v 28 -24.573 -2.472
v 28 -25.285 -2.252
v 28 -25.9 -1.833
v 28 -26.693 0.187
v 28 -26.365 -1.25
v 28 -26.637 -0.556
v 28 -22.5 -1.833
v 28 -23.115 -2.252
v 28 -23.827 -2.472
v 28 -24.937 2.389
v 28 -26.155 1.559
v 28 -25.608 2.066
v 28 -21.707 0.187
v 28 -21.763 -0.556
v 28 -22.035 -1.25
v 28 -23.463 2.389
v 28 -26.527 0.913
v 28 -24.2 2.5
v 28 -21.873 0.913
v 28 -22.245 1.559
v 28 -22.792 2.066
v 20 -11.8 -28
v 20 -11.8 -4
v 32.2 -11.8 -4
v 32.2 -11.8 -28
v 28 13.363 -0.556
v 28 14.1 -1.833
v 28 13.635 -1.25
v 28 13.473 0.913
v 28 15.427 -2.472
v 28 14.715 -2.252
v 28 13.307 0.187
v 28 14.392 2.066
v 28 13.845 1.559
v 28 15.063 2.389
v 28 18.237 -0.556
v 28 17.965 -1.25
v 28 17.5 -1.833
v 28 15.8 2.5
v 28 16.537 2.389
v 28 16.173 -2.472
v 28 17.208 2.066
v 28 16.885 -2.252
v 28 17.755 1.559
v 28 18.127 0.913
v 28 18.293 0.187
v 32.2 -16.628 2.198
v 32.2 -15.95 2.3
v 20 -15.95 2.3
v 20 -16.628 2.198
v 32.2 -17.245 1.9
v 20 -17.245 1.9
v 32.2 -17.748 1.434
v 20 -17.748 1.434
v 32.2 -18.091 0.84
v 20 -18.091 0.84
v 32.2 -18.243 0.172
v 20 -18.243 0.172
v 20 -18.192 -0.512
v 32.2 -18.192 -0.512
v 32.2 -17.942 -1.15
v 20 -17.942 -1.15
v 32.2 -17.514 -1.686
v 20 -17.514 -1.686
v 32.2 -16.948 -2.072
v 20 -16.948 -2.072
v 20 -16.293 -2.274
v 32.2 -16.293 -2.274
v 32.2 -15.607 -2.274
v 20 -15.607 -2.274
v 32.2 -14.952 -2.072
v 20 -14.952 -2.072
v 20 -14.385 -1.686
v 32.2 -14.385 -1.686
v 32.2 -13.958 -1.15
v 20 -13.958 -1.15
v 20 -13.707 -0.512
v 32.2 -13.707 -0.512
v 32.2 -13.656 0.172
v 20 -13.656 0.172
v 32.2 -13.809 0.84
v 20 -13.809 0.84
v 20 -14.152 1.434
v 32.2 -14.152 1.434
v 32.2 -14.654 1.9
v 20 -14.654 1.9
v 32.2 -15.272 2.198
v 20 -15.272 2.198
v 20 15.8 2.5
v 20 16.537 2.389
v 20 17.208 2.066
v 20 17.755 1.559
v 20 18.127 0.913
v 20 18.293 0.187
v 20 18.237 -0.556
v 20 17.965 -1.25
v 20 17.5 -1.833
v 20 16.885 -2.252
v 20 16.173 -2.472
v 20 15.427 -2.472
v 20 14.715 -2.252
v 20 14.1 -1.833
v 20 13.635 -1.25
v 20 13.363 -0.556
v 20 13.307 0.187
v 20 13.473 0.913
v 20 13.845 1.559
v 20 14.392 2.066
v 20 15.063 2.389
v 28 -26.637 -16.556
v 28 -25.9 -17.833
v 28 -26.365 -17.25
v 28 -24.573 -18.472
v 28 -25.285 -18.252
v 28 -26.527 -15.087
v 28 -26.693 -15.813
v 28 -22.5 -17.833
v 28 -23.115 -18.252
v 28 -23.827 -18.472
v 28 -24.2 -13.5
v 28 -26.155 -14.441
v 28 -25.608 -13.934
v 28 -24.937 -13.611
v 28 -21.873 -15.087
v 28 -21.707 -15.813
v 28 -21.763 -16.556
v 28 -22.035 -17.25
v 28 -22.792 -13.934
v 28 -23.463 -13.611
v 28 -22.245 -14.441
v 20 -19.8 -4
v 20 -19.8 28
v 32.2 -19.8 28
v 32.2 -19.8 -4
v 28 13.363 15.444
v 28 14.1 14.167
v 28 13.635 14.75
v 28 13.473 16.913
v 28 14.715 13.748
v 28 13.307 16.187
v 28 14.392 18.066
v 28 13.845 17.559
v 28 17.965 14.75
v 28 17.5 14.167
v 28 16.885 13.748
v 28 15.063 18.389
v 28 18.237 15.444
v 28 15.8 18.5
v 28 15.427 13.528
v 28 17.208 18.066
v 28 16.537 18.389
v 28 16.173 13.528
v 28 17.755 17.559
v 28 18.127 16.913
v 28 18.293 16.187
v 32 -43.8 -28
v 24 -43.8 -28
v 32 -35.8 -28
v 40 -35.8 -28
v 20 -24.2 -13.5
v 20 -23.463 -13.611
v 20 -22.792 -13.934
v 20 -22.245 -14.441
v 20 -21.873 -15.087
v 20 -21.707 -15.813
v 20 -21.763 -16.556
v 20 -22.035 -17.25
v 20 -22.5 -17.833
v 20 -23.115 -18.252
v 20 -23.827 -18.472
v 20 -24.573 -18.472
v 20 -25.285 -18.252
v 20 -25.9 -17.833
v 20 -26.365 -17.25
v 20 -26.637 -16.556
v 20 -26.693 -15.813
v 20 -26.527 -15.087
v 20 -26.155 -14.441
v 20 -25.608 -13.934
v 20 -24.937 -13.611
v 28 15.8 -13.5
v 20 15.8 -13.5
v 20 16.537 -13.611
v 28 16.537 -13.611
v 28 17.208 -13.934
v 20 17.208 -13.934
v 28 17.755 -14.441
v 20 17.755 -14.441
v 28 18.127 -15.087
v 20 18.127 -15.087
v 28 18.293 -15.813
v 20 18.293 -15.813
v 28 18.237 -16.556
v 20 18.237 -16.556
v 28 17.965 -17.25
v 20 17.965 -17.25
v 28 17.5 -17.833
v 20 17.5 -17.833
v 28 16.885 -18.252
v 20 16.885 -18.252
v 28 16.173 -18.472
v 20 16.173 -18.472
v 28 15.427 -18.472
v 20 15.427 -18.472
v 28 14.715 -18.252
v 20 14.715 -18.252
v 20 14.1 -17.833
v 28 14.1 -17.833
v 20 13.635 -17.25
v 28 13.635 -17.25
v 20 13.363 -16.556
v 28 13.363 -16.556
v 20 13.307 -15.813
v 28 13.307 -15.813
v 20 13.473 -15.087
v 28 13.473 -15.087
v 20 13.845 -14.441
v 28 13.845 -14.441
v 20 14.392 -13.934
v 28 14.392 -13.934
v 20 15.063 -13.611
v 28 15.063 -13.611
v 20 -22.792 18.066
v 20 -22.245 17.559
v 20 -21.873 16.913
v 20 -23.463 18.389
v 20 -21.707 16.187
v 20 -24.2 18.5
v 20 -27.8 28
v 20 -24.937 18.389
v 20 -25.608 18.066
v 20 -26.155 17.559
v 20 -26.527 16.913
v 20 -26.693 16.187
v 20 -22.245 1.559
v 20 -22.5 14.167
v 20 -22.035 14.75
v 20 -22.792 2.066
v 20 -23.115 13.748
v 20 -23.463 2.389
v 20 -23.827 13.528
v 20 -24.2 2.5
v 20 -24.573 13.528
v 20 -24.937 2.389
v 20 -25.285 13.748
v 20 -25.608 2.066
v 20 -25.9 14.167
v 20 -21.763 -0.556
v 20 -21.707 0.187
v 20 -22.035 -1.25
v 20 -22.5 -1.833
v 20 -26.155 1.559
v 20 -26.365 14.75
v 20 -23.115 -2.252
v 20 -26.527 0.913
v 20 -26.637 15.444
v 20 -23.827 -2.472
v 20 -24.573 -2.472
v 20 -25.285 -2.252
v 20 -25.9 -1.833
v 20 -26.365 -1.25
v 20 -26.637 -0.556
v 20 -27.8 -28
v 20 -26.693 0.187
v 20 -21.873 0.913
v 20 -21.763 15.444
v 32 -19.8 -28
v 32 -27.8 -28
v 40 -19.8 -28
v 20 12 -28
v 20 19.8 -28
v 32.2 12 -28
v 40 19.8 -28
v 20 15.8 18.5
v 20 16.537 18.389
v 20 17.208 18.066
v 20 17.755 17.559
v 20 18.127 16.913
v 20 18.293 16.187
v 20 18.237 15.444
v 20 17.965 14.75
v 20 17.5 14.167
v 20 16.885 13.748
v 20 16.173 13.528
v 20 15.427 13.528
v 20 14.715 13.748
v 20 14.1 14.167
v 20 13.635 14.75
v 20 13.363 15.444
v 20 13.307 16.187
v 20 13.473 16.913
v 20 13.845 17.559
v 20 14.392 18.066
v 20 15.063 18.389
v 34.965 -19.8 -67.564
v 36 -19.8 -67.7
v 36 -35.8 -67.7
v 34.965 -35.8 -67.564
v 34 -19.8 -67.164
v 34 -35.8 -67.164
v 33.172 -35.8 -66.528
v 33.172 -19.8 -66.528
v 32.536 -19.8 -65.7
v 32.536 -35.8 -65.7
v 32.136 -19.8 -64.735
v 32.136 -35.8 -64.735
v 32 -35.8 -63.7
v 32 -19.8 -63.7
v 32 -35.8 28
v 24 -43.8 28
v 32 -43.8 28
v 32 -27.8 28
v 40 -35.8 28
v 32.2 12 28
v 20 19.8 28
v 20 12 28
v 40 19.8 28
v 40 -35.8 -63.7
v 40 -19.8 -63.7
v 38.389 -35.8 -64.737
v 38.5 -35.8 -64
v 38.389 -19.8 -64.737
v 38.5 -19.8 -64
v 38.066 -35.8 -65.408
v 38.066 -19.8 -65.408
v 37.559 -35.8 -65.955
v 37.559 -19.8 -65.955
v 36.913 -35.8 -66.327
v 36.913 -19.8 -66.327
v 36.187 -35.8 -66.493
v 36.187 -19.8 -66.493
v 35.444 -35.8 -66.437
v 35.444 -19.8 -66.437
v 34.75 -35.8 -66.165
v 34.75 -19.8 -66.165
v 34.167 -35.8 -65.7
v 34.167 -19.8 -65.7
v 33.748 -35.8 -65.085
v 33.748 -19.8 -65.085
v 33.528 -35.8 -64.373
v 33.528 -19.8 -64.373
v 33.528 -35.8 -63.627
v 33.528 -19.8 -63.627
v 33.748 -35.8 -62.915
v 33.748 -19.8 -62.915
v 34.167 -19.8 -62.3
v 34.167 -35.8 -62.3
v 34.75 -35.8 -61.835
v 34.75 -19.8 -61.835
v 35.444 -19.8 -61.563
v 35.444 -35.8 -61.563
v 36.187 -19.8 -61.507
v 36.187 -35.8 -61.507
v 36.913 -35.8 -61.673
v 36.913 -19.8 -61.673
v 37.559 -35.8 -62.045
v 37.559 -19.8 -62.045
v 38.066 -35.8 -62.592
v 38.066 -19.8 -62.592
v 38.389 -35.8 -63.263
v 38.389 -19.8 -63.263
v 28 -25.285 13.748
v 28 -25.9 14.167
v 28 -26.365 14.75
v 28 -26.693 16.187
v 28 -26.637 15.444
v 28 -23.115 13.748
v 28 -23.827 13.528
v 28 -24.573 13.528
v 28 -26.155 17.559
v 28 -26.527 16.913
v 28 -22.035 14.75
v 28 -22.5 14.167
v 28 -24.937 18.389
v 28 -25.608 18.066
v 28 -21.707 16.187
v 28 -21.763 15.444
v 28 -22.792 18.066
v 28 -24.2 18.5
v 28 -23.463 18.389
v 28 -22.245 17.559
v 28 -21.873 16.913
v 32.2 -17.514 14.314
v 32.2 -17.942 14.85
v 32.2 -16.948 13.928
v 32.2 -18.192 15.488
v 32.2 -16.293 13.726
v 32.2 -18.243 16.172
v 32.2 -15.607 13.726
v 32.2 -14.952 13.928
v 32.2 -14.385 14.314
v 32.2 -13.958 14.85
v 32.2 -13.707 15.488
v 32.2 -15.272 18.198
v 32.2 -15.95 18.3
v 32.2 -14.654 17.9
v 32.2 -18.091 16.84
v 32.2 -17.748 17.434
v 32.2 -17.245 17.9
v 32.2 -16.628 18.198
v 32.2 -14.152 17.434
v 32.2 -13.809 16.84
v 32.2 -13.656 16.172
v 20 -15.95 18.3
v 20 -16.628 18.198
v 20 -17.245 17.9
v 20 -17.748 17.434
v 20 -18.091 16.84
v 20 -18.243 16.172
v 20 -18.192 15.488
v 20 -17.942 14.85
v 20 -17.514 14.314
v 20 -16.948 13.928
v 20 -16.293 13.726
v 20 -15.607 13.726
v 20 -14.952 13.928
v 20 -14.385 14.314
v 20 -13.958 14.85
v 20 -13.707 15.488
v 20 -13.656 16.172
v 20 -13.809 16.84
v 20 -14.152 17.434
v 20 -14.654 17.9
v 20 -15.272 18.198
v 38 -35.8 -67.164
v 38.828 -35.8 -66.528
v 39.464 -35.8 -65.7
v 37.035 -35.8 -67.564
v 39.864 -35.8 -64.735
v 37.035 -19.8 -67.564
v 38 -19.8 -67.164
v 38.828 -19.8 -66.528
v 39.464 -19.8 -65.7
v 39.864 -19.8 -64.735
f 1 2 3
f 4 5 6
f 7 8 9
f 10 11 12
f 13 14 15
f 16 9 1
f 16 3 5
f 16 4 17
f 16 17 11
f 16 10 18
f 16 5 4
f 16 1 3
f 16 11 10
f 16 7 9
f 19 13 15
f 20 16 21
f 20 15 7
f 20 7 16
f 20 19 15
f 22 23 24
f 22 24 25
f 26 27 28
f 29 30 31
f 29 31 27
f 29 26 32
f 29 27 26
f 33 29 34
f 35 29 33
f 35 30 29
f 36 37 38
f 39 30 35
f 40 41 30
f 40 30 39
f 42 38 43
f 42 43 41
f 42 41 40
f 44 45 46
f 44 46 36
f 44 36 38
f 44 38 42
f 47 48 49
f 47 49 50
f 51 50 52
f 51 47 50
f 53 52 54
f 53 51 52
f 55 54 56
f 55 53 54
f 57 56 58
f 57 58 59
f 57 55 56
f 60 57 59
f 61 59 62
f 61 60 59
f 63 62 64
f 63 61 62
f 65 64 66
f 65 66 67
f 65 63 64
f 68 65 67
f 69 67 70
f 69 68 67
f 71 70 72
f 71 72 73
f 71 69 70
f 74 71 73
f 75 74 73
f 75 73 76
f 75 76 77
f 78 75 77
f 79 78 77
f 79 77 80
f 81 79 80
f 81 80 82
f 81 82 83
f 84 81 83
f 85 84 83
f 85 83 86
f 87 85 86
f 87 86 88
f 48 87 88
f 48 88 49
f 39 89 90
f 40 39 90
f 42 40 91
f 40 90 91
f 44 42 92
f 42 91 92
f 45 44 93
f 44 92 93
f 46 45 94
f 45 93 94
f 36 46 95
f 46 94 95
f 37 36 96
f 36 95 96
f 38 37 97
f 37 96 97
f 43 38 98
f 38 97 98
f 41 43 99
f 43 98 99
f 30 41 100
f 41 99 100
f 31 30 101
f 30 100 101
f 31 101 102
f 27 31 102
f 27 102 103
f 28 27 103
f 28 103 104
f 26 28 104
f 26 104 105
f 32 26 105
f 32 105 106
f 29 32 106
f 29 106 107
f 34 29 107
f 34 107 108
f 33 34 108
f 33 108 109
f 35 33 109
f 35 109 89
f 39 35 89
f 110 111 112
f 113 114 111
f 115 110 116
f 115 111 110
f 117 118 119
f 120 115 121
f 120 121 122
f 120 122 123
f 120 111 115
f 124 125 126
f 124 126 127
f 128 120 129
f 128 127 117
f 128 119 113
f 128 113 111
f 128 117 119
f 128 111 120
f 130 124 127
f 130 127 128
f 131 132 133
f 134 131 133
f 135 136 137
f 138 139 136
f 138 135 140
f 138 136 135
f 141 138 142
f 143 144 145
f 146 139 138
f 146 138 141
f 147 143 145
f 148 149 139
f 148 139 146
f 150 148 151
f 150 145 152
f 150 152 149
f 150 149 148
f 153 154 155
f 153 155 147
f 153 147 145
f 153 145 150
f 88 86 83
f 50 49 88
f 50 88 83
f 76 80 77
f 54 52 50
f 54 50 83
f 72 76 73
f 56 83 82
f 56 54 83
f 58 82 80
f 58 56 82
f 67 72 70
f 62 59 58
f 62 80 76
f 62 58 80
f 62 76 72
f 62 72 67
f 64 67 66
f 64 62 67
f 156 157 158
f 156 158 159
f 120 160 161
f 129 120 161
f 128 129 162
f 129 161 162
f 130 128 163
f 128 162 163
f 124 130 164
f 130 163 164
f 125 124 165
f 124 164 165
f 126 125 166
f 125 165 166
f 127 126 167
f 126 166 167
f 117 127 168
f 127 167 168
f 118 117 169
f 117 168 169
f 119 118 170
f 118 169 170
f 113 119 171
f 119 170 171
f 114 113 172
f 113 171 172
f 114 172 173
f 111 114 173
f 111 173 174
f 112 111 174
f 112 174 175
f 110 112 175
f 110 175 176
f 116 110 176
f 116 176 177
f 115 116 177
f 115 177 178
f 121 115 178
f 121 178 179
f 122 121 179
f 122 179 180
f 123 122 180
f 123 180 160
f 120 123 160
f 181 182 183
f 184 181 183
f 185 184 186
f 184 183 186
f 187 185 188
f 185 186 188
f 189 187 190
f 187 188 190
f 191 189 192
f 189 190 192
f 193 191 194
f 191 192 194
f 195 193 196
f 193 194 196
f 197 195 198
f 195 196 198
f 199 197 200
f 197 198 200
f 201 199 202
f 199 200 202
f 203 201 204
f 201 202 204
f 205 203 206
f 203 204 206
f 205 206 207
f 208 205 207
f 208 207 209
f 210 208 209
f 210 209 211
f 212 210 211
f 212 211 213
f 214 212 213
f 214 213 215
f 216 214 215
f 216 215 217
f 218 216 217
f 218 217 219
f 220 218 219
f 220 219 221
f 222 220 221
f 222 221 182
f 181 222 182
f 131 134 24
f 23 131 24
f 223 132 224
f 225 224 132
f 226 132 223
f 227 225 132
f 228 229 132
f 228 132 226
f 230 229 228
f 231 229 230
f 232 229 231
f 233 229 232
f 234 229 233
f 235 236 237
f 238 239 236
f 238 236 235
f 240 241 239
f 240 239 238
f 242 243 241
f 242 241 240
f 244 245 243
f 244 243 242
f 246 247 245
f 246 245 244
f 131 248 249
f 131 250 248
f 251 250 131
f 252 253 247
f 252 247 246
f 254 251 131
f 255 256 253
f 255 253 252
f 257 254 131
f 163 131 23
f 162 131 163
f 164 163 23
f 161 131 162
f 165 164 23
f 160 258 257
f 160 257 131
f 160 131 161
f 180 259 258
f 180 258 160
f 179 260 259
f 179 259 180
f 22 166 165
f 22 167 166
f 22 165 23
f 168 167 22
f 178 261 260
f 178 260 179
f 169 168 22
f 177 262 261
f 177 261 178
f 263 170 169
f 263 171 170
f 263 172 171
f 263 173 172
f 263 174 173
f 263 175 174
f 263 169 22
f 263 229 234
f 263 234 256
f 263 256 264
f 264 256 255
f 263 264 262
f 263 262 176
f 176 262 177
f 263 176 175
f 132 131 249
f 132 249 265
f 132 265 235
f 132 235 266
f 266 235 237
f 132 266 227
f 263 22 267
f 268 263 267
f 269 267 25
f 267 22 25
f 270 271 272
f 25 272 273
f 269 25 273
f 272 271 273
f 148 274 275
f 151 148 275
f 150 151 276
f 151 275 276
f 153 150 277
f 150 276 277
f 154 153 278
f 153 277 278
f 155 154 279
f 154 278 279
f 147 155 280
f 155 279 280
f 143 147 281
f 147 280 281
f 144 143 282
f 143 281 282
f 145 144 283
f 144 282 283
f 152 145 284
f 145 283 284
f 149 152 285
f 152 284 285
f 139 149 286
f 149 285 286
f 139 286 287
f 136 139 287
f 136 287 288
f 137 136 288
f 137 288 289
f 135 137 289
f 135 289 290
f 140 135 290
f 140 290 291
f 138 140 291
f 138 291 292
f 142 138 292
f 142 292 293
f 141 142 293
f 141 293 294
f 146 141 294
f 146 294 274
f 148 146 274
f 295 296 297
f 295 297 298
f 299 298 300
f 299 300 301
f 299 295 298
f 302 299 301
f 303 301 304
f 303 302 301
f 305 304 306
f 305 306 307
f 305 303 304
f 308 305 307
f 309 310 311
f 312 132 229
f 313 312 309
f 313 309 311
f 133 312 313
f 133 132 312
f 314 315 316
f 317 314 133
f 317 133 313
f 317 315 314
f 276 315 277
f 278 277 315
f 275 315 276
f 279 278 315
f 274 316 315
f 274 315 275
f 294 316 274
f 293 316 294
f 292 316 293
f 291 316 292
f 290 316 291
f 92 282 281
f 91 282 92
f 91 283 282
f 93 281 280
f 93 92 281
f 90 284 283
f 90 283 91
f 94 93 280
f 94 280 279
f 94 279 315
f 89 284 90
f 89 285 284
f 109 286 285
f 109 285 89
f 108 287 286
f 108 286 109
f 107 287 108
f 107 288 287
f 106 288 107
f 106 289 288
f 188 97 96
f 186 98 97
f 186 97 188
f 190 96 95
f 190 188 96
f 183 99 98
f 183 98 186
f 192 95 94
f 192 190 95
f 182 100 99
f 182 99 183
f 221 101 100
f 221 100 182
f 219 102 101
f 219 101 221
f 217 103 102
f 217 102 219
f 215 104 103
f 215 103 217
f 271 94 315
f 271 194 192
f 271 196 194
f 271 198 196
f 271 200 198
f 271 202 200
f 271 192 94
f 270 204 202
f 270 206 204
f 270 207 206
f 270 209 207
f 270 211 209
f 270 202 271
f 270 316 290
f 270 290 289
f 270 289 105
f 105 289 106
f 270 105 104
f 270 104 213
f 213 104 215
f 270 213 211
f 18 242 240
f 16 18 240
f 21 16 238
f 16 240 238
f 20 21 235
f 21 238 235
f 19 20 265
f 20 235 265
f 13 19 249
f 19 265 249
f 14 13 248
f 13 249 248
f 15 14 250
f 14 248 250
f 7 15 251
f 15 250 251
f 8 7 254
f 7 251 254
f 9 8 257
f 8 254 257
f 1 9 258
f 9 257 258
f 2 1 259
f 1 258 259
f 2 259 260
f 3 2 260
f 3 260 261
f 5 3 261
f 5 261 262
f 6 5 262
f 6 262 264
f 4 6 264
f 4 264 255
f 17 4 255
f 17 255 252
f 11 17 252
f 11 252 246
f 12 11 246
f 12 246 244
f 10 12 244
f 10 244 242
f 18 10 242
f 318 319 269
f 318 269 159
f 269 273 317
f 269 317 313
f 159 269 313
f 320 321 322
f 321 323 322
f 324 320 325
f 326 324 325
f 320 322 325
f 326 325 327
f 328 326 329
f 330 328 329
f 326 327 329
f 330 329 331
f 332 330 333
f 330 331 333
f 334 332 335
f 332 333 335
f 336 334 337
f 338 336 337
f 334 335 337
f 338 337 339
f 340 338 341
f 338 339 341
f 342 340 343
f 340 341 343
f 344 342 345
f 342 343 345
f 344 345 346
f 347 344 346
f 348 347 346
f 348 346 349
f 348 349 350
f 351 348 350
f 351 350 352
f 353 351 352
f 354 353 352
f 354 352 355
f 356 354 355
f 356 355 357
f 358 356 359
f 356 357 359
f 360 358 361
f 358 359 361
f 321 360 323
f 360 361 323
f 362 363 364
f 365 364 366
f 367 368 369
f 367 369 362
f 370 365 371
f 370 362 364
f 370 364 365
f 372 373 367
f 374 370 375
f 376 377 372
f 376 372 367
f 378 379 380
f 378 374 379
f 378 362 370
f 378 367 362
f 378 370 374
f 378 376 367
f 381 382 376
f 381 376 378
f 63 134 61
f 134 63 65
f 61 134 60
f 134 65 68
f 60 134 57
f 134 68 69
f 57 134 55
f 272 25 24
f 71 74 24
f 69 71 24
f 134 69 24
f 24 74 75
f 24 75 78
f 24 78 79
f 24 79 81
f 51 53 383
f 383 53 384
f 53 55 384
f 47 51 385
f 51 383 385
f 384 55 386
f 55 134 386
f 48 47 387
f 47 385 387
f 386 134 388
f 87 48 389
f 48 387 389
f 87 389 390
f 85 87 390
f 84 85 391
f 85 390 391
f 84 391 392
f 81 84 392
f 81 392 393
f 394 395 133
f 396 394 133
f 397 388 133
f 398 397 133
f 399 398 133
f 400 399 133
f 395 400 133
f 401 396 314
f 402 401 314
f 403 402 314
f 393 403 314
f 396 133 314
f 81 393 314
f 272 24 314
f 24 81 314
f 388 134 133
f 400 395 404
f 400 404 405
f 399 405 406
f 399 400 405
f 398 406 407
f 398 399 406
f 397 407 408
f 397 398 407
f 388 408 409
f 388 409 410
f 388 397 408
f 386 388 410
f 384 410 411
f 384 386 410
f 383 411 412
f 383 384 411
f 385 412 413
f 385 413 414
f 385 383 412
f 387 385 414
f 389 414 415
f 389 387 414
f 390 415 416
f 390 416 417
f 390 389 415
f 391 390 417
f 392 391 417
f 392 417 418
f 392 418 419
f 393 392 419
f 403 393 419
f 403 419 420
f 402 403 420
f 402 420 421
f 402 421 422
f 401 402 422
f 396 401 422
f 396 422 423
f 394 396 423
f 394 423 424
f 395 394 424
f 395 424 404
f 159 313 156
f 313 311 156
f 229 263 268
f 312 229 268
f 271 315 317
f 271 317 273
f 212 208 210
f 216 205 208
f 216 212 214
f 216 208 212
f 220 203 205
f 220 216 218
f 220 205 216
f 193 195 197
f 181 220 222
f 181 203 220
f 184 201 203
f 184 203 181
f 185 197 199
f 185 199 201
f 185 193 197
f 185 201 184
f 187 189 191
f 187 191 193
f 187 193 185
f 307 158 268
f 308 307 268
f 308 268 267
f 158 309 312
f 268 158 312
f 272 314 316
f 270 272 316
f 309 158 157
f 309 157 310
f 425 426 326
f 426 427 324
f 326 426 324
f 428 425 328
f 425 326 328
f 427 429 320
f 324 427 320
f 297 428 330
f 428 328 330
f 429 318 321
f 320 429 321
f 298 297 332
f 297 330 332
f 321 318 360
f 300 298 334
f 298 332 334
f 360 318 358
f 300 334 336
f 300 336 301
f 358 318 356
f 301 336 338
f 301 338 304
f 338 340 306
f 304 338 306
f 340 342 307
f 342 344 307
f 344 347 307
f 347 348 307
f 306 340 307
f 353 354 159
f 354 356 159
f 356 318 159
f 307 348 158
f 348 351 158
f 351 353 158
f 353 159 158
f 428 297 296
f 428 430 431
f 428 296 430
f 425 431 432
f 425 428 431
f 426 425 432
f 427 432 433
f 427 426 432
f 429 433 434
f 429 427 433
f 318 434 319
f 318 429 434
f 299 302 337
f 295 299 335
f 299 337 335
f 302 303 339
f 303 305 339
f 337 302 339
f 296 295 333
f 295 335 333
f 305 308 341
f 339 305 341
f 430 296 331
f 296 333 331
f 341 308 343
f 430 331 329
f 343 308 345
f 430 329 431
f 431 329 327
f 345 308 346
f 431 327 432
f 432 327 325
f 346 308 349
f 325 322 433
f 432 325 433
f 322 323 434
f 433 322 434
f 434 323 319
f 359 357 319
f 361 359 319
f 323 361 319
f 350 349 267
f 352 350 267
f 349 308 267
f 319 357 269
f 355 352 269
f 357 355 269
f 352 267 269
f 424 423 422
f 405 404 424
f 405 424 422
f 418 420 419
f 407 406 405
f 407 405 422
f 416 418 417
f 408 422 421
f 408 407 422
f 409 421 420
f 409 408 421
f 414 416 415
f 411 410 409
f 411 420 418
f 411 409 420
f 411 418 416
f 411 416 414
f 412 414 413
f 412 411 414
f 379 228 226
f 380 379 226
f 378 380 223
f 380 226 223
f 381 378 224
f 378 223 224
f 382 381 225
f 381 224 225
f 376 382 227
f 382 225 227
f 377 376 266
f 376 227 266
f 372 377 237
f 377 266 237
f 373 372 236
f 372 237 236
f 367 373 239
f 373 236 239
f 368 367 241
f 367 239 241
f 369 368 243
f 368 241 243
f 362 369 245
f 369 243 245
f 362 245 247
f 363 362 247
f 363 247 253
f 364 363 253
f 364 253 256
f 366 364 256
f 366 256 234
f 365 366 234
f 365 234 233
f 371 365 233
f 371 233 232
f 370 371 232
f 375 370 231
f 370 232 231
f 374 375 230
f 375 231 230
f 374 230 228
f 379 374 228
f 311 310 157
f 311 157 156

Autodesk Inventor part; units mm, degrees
ref_plane "YZ Plane" through (0, 0, 0) normal (1, 0, 0) x (0, 1, 0)
ref_plane "XZ Plane" through (0, 0, 0) normal (0, 1, 0) x (-1, 0, 0)
ref_plane "XY Plane" through (0, 0, 0) normal (0, 0, 1) x (1, 0, 0)
sketch "Sketch1" plane through (0, 0, 0) normal (1, 0, 0) x (0, 1, 0)
  line L0 (-19.8, 28) -> (19.8, 28)
  line L1 (19.8, 28) -> (19.8, -28)
  line L2 (19.8, -28) -> (-19.8, -28)
  line L3 (-19.8, -28) -> (-19.8, 28)
  line L4 (-19.8, 28) -> (19.8, -28) construction
  line L5 (19.8, 28) -> (-19.8, -28) construction
  point P0 (0, 0)
  dimension "d0" = 39.6
  dimension "d1" = 56
extrude "Extrusion1" add sketch "Sketch1" along normal blind 40
sketch "Sketch2" plane through (0, -19.8, 28) normal (0, 0, 1) x (1, 0, 0)
  line L0 (7.8, 0) -> (32.2, 0)
  line L1 (32.2, 0) -> (32.2, 31.8)
  line L2 (32.2, 31.8) -> (7.8, 31.8)
  line L3 (7.8, 31.8) -> (7.8, 0)
  line L4 (0, 0) -> (40, 0) projected
  line L5 (40, 39.6) -> (40, 0) projected
  dimension "d4" = 24.4
  dimension "d5" = 31.8
  dimension "d6" = 7.8
extrude "Extrusion2" cut sketch "Sketch2" against normal blind 64
sketch "Sketch3" plane through (32.2, -19.8, 28) normal (-1, 0, 0) x (0, 0, 1)
  circle A0 centre (-12, 3.8502) radius 2.3
  circle A1 centre (-28, 3.8502) radius 2.3
  line L0 (0, 31.8) -> (0, 0) projected
  point P0 (-28, 19.8)
  dimension "d9" = 4.6
  dimension "d10" = 4.6
  dimension "d11" = 16
  dimension "d12" = 12
extrude "Extrusion3" add sketch "Sketch3" along normal blind 26
sketch "Sketch4" plane through (7.8, -19.8, 28) normal (1, 0, 0) x (0, 0, -1)
  line L0 (56, 0) -> (0, 0) projected
  line L1 (56, 0) -> (32, 0)
  line L2 (32, 0) -> (32, 8)
  line L3 (32, 8) -> (56, 8)
  line L4 (56, 8) -> (56, 0)
  point P0 (28, 19.8)
  point P1 (32, 0)
  dimension "d15" = 24
  dimension "d16" = 8
extrude "Extrusion4" add sketch "Sketch4" along normal blind 26
sketch "Sketch14" plane through (0, 19.8, 28) normal (0, 1, 0) x (1, 0, 0)
  line L0 (20, 0) -> (20, 56) projected
  point P0 (0, 28)
sketch "Sketch15" plane through (0, -19.8, -28) normal (0, -1, 0) x (1, 0, 0)
  line L0 (40, 0) -> (40, 56) projected
  line L1 (0, 0) -> (40, 0) projected
  line L2 (0, 56) -> (40, 56) projected
  line L3 (0, 0) -> (0, 56) projected
  point P0 (0, 28)
extrude "Extrusion7" add sketch "Sketch15" along normal blind 24
sketch "Sketch16" plane through (0, 19.8, 28) normal (0, 0, 1) x (1, 0, 0)
  line L0 (8, -47.6) -> (32, -47.6)
  line L1 (32, -47.6) -> (32, -55.6)
  line L2 (32, -55.6) -> (8, -55.6)
  line L3 (8, -55.6) -> (8, -47.6)
  line L4 (40, -63.6) -> (0, -63.6) projected
  line L5 (0, 0) -> (0, -63.6) projected
  line L6 (16, -55.6) -> (24, -55.6)
  line L7 (24, -55.6) -> (24, -63.6)
  line L8 (24, -63.6) -> (16, -63.6)
  line L9 (16, -63.6) -> (16, -55.6)
  point P0 (0, -19.8)
  dimension "d37" = 24
  dimension "d38" = 8
  dimension "d39" = 8
  dimension "d40" = 8
  dimension "d41" = 8
  dimension "d42" = 8
  dimension "d43" = 16
extrude "Extrusion8" cut sketch "Sketch16" against normal through all
chamfer "Chamfer1" distance 8 angle 45 2 edges at (40, -43.8, 0) (0, -43.8, 0)
chamfer "Chamfer2" distance 8 angle 45 2 edges at (16, -35.8, 0) (24, -35.8, 0)
split body "Split2" sketch "Sketch14" result one side removed curves L0 removed pieces at (0.5, -17.2667, 9.3333)
sketch "Sketch17" plane through (20, -27.8, -28) normal (-1, 0, 0) x (0, 0, 1)
  circle A0 centre (12, 3.6) radius 2.5
  circle A1 centre (28, 3.6) radius 2.5
  circle A2 centre (44, 3.6) radius 2.5
  circle A3 centre (12, 43.6) radius 2.5
  circle A4 centre (44, 43.6) radius 2.5
  circle A5 centre (28, 43.6) radius 2.5
  line L0 (0, 47.6) -> (56, 47.6) projected
  line L1 (0, 39.8) -> (0, 47.6) projected
  point P0 (28, 27.8)
  dimension "d52" = 5
  dimension "d53" = 5
  dimension "d55" = 5
  dimension "d56" = 5
  dimension "d57" = 5
  dimension "d58" = 5
  dimension "d59" = 16
  dimension "d60" = 16
  dimension "d61" = 40
  dimension "d62" = 4
  dimension "d63" = 12
extrude "Extrusion9" cut sketch "Sketch17" against normal blind 8
sketch "Sketch22" plane through (32.2, -11.8, -28) normal (0, 0, -1) x (-1, 0, 0)
  line L0 (0.2, -32) -> (-7.8, -24) projected
  line L1 (-7.8, -24) -> (0.2, -24)
  line L2 (0.2, -24) -> (0.2, -8)
  line L3 (0.2, -8) -> (-7.8, -8)
  line L4 (-7.8, -8) -> (-7.8, -24)
  point P0 (32.2, 11.8)
  dimension "d82" = 8
  dimension "d83" = 16
extrude "Extrusion13" add sketch "Sketch22" along normal blind 39.7
sketch "Sketch23" plane through (32, -19.8, -28) normal (0, 1, 0) x (1, 0, 0)
  circle A0 centre (4, 36) radius 2.5
  line L0 (8, 0) -> (8, 39.7) projected
  line L1 (0, 39.7) -> (8, 39.7) projected
  point P0 (-32, -28)
  dimension "d86" = 5
  dimension "d87" = 4
  dimension "d88" = 3.7
extrude "Extrusion14" cut sketch "Sketch23" against normal through all
fillet "Fillet2" radius 4 2 edges at (40, -27.8, -67.7) (32, -27.8, -67.7)
properties part number "MotorHolder_X_R"
